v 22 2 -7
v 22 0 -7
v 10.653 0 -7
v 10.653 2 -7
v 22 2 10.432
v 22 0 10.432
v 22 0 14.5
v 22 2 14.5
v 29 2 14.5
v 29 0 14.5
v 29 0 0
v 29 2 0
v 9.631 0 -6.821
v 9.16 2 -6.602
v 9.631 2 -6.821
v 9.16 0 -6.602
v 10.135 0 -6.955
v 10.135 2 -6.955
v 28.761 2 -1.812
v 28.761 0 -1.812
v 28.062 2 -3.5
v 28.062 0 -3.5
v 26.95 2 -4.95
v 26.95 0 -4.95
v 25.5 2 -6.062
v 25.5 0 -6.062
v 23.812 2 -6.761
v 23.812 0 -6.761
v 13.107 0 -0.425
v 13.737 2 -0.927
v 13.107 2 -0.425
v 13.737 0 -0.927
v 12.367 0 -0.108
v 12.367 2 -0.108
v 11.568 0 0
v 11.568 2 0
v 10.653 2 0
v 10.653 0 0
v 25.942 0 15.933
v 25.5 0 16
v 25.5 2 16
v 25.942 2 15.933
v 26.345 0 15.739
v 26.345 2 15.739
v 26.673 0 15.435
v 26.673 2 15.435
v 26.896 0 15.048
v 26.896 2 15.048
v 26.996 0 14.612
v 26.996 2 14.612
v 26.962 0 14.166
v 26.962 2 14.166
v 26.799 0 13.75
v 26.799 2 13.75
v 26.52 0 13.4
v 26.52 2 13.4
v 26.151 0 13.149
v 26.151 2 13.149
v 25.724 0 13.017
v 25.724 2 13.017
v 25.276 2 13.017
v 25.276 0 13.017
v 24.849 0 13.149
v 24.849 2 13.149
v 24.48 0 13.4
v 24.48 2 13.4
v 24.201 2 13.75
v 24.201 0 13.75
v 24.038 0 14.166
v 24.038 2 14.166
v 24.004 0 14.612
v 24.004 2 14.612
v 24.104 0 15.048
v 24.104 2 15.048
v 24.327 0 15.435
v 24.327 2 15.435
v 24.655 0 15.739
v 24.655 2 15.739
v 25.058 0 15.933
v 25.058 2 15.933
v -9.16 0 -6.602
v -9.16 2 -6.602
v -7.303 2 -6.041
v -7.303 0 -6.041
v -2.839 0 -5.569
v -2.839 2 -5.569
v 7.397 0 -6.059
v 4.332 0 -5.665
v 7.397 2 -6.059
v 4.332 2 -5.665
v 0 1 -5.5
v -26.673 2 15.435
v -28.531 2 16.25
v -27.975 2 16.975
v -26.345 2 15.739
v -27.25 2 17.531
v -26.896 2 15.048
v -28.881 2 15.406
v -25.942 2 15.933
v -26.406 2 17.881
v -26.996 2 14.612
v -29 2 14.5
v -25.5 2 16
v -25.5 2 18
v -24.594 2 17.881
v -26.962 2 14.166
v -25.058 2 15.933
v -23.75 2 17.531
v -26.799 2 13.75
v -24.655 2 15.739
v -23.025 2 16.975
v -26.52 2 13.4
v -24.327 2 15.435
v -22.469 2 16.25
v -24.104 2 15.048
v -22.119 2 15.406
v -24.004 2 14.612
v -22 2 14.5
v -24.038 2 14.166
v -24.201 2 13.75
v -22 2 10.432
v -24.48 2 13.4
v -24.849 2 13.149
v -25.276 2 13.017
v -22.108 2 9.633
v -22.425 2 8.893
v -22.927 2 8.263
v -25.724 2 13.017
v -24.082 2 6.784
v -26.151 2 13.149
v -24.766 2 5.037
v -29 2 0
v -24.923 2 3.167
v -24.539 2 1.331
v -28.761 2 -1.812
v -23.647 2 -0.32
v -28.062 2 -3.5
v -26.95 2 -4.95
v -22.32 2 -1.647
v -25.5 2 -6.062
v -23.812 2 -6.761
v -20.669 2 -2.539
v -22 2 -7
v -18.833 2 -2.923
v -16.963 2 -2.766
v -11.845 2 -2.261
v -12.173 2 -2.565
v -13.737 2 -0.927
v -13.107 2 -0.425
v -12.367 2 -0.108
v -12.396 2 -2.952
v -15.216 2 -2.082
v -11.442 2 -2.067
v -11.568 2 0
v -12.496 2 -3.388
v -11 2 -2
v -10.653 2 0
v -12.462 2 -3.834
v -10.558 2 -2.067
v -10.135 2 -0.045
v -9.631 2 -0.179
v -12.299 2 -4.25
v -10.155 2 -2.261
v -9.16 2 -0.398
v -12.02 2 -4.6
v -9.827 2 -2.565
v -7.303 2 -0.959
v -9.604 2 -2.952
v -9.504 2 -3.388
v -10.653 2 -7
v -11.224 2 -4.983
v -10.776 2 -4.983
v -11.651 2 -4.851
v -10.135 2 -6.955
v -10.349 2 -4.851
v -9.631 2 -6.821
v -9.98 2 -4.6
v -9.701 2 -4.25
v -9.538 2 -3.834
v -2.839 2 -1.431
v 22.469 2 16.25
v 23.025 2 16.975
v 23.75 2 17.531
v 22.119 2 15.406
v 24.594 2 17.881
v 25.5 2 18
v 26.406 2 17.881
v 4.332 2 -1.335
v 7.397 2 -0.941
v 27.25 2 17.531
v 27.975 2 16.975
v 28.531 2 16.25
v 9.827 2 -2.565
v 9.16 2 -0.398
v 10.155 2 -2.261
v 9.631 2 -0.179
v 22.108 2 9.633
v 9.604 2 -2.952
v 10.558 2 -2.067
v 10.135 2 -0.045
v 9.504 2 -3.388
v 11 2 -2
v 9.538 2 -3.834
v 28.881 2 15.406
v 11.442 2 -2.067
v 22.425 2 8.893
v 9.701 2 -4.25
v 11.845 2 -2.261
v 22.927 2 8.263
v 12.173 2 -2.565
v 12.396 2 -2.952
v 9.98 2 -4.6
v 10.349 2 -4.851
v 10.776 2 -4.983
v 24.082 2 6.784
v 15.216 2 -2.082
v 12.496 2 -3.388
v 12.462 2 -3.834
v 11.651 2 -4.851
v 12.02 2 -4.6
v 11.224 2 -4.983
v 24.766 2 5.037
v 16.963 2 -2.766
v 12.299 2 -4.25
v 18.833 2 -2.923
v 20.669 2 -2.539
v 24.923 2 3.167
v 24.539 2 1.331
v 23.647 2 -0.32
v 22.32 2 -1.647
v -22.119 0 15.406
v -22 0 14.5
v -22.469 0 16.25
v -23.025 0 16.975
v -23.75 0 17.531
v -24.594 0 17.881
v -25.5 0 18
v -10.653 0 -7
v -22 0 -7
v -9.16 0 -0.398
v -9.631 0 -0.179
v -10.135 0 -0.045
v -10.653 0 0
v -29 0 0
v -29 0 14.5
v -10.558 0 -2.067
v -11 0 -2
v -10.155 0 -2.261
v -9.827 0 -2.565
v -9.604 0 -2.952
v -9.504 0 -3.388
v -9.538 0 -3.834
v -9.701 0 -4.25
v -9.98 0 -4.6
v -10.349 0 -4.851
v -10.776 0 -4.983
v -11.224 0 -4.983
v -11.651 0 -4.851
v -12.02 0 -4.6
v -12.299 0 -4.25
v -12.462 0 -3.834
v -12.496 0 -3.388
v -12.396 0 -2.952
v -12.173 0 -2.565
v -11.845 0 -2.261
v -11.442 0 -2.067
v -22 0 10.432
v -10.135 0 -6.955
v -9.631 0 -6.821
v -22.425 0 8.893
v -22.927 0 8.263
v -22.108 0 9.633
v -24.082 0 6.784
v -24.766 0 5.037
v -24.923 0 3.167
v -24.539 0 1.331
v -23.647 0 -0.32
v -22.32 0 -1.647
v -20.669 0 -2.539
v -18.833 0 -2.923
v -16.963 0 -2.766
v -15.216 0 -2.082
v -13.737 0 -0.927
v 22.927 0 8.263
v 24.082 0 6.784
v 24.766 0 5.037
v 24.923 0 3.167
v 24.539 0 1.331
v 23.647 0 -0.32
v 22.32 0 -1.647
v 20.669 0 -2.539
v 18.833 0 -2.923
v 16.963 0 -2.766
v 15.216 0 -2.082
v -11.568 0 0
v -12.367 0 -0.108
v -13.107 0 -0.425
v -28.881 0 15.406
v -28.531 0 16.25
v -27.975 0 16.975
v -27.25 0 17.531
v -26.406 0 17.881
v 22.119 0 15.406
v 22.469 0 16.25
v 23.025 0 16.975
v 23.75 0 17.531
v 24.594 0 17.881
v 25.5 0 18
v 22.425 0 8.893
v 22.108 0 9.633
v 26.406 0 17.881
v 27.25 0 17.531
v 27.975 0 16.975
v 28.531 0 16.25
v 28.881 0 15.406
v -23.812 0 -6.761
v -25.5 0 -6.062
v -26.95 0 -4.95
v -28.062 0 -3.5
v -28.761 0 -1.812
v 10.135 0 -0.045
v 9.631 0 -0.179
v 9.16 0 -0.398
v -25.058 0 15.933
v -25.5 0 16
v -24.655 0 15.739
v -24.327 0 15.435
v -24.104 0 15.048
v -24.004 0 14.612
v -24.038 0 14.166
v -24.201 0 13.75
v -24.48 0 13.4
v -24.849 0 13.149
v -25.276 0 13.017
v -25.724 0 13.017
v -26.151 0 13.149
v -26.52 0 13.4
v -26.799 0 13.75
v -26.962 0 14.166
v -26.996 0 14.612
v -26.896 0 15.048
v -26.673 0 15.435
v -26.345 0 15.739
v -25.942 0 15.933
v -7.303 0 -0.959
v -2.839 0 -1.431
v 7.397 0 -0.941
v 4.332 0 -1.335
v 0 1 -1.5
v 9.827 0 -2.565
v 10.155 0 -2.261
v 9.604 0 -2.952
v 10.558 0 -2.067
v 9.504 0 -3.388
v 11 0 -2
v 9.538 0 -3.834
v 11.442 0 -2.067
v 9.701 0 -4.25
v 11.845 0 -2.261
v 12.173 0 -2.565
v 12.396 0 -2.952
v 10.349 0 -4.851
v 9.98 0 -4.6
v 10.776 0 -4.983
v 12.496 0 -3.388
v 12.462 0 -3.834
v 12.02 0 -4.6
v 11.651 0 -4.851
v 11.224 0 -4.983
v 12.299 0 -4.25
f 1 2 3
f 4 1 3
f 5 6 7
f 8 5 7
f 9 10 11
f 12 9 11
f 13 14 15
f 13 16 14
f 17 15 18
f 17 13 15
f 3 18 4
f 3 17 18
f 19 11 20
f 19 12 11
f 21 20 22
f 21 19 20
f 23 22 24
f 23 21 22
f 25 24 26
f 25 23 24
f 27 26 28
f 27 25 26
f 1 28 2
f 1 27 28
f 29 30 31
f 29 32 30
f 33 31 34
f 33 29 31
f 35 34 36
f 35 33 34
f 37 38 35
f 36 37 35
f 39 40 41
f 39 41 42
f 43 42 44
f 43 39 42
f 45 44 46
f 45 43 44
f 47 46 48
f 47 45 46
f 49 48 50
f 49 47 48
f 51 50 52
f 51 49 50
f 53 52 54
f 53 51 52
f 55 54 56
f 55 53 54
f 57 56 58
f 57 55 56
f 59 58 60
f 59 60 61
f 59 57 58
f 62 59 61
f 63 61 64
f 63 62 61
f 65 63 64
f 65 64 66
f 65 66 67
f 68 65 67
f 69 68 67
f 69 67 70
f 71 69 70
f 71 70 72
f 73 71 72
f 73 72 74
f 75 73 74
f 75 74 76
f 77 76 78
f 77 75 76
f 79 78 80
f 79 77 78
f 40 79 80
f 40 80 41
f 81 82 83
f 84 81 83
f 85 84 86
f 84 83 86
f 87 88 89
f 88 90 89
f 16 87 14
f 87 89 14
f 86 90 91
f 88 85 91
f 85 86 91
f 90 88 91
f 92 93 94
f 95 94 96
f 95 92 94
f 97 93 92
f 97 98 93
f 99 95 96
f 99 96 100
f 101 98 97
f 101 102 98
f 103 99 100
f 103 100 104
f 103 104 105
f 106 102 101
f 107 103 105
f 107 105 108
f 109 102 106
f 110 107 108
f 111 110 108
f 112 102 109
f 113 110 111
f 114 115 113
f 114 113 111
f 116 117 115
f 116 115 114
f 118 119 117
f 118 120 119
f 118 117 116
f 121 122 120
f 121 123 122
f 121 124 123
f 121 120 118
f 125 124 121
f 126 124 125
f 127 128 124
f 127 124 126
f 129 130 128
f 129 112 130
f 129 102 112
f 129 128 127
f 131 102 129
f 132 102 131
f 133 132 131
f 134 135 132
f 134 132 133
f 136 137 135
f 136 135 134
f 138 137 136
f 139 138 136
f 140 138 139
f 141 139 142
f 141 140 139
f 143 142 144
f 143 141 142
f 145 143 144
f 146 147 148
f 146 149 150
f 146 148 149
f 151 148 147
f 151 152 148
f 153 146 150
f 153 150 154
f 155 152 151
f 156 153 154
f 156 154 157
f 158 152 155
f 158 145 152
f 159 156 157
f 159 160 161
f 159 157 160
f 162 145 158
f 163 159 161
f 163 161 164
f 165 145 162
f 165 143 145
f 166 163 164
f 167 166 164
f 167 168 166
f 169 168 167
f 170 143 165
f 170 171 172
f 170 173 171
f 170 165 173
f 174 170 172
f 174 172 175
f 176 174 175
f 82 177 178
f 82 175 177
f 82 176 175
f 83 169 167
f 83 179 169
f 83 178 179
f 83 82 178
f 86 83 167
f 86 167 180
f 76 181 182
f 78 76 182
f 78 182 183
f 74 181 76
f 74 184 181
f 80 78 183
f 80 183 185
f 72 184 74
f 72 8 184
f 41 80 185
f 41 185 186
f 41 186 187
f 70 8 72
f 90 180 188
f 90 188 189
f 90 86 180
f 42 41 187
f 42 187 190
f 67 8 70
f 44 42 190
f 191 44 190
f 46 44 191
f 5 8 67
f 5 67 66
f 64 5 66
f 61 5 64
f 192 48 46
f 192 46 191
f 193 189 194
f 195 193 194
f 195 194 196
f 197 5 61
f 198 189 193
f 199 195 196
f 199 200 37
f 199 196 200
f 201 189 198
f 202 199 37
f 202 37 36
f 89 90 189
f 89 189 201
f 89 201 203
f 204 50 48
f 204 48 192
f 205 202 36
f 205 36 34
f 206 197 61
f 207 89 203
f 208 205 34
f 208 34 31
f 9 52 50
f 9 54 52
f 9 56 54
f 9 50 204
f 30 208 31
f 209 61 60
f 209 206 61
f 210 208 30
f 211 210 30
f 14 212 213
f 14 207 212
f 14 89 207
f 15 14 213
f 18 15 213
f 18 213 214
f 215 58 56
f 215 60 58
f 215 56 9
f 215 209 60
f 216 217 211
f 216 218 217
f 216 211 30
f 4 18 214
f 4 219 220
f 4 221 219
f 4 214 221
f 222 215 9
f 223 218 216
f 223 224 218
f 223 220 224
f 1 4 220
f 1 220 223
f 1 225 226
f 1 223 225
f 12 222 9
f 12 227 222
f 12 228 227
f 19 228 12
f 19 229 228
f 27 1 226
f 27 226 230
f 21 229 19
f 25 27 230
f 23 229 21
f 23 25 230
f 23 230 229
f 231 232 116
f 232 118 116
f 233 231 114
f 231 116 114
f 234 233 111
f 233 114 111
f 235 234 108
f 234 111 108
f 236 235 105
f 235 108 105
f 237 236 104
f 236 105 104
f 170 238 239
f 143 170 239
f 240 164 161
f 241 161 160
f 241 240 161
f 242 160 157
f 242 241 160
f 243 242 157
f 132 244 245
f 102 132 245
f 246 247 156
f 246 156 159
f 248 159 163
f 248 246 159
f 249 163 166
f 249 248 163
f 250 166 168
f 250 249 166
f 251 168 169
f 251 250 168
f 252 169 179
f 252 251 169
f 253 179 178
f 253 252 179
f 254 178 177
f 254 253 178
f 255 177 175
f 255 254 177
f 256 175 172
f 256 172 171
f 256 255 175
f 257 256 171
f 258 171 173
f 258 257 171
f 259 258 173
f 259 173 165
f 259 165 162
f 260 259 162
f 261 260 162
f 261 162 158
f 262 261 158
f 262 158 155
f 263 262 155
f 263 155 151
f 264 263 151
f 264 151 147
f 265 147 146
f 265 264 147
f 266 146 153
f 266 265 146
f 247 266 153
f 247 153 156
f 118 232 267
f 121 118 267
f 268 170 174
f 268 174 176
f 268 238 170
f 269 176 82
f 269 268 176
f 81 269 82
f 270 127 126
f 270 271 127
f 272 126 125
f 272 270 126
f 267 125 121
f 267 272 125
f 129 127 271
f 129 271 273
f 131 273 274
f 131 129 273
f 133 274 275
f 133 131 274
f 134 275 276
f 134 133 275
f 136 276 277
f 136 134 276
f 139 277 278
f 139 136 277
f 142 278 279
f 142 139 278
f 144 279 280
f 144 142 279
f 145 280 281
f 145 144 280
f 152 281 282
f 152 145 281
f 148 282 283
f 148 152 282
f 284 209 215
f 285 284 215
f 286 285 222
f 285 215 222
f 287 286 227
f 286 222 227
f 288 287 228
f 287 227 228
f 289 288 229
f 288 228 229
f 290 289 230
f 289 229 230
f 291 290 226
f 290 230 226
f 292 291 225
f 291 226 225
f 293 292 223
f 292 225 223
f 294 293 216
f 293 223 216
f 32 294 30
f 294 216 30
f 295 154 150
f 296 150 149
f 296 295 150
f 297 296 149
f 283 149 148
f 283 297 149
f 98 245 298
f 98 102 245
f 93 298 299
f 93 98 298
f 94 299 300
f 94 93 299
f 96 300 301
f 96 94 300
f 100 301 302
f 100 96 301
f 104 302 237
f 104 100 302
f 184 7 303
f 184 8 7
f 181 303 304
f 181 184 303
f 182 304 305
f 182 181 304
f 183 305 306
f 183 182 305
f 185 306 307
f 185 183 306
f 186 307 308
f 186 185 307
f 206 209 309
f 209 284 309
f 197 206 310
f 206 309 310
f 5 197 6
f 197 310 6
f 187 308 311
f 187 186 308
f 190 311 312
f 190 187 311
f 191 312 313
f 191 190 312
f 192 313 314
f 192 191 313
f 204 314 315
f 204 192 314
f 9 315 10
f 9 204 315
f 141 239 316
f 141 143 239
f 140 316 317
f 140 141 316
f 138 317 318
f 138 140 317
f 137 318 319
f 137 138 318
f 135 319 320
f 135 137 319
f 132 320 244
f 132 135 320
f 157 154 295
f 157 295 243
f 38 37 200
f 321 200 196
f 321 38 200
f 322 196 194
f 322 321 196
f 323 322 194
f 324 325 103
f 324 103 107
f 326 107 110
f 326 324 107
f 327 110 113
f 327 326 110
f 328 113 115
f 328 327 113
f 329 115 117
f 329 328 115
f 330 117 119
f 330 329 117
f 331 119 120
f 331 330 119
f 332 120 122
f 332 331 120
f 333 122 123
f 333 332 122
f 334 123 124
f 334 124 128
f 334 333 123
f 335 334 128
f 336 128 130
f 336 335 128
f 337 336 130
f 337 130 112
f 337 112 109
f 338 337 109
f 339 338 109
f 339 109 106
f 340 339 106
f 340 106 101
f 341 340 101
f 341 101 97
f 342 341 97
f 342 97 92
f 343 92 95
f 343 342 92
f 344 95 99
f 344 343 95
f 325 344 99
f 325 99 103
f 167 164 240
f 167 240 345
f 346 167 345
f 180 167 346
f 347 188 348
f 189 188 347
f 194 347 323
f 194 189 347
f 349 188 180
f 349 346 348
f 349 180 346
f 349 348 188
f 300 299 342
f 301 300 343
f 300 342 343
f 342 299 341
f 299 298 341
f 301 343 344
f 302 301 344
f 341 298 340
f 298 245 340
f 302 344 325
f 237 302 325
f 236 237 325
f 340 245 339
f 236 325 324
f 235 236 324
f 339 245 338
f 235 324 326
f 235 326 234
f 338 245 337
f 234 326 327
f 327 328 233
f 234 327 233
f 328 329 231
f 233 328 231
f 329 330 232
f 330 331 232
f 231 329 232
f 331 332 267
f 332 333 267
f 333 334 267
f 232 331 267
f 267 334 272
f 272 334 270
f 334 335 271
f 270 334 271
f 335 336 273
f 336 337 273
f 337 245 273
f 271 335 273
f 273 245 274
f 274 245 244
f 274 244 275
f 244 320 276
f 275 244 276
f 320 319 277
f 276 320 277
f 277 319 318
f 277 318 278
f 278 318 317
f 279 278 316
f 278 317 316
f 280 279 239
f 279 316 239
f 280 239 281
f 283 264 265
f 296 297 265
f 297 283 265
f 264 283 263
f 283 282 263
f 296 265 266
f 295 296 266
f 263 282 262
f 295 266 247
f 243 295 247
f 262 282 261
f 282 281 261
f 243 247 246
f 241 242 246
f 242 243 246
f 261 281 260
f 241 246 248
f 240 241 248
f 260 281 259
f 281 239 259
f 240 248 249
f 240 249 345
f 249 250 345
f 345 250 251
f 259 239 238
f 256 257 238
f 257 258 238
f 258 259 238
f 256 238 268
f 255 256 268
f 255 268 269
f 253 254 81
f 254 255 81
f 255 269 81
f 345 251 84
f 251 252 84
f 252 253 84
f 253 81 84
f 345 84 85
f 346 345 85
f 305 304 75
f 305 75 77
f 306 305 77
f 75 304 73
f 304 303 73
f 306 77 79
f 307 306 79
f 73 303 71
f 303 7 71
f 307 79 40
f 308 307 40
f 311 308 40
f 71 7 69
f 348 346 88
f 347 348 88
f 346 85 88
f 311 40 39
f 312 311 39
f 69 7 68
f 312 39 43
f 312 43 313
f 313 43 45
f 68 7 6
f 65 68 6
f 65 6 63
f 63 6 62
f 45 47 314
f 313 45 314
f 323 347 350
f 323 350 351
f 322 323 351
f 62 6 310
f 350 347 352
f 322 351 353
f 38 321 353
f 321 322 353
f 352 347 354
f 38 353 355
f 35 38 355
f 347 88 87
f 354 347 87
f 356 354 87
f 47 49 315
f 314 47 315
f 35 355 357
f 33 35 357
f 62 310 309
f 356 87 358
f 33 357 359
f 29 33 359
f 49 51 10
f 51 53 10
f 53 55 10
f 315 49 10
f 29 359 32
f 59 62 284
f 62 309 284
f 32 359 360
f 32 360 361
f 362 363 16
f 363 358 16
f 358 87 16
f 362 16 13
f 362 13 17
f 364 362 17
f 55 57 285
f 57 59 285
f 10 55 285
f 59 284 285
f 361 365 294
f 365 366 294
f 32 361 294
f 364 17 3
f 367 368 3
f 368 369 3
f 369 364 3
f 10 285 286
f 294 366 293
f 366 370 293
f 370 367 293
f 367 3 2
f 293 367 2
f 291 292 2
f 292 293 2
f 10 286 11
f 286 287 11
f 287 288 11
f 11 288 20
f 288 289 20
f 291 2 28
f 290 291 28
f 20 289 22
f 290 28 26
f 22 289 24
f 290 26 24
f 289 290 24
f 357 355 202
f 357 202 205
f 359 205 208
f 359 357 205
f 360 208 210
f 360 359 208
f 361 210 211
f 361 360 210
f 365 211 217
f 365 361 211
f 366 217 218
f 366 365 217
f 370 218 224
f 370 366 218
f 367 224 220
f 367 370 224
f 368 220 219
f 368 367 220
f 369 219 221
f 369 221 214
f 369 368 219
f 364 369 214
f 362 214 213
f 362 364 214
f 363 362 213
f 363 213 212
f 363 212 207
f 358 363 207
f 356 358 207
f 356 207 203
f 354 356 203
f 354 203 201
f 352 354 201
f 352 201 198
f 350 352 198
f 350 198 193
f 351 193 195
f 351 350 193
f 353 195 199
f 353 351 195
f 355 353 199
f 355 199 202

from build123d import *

# Parameters (mm, degrees)
SKETCH1_R      = 1.5
EXTRUDE1_DEPTH = 2
FILLET1_R      = 3
FILLET2_R      = 3.5
EXTRUDE2_DEPTH = 2
EXTRUDE3_DEPTH = 2
FILLET3_R      = 3
FILLET5_R      = 7


with BuildPart() as part:
    # Sketch1 → Extrude1 (new body)
    # profile 1 of 2: a face of its own
    with BuildSketch(Plane(origin=(0, 0, 0), x_dir=(1, 0, 0), z_dir=(0, 1, 0))):
        Polygon((-22, 0), (0, 0), (0, 7), (-29, 7), (-29, -18), (-22, -18), align=None)
        with Locations(Location((-25.5, -14.5, 0), (0, 0, 270))):
            Circle(SKETCH1_R, mode=Mode.SUBTRACT)
        with Locations(Location((-11, 3.5, 0), (0, 0, 270))):
            Circle(SKETCH1_R, mode=Mode.SUBTRACT)
    # profile 2 of 2: a face of its own
    with BuildSketch(Plane(origin=(0, 0, 0), x_dir=(1, 0, 0), z_dir=(0, 1, 0))):
        Polygon((0, 0), (22, 0), (22, -18), (29, -18), (29, 7), (0, 7), align=None)
        with Locations(Location((25.5, -14.5, 0), (0, 0, 270))):
            Circle(SKETCH1_R, mode=Mode.SUBTRACT)
        with Locations(Location((11, 3.5, 0), (0, 0, 270))):
            Circle(SKETCH1_R, mode=Mode.SUBTRACT)
    extrude(amount=EXTRUDE1_DEPTH)

    # Fillet1
    fillet1_edges = [part.edges().sort_by_distance(p)[0] for p in [
        (-22, 1, 0),
        (22, 1, 0),
    ]]
    fillet(fillet1_edges, radius=FILLET1_R)

    # Fillet2
    fillet2_edges = [part.edges().sort_by_distance(p)[0] for p in [
        (29, 1, 18),
        (22, 1, 18),
        (-22, 1, 18),
        (-29, 1, 18),
    ]]
    fillet(fillet2_edges, radius=FILLET2_R - 0.0001)  # a hair under: the kernel refuses the full size

    # Sketch2 → Extrude2 (cut)
    with BuildSketch(Plane(origin=(0, 2, 0), x_dir=(1, 0, 0), z_dir=(0, 1, 0))):
        with BuildLine():
            Line((-9.5, 7), (9.5, 7))
            add(Edge.make_bspline(
                [(-9.5, 7), (-9.5, 5.5), (0, 5.5), (9.5, 5.5), (9.5, 7)],
                knots=[0, 0, 0, 1.570796327, 1.570796327, 3.141592654, 3.141592654, 3.141592654], degree=2, weights=[1, 0.707106781, 1, 0.707106781, 1]))
        make_face()
    extrude2 = extrude(amount=-EXTRUDE2_DEPTH, mode=Mode.SUBTRACT)

    # Mirror1: Extrude2 across plane
    add(extrude2.mirror(Plane(origin=(0, 0, -3.5), x_dir=(1, 0, 0), z_dir=(0, 0, -1))), mode=Mode.SUBTRACT)

    # Sketch3 → Extrude3 (cut)
    with BuildSketch(Plane(origin=(0, 2, 0), x_dir=(-1, 0, 0), z_dir=(0, 1, 0))):
        with BuildLine():
            Line((-13, 0), (-19, 0))
            ThreePointArc((-19, 0), (-21.121320344, 0.878679656), (-22, 3))
            Line((-22, 3), (-22, 9))
            ThreePointArc((-22, 9), (-23.031608424, -1.031608424), (-13, 0))
        make_face()
    extrude3 = extrude(amount=-EXTRUDE3_DEPTH, mode=Mode.SUBTRACT)

    # Mirror4: Extrude3 across plane
    add(extrude3.mirror(Plane(origin=(0, 0, 0), x_dir=(0, 0, 1), z_dir=(1, 0, 0))), mode=Mode.SUBTRACT)

    # Fillet3
    fillet3_edges = [part.edges().sort_by_distance(p)[0] for p in [
        (9.5, 1, 0),
        (-9.5, 1, 0),
        (22, 1, 9),
        (13, 1, 0),
        (-9.5, 1, -7),
        (9.5, 1, -7),
        (-22, 1, 9),
        (-13, 1, 0),
    ]]
    fillet(fillet3_edges, radius=FILLET3_R)

    # Fillet5
    fillet5_edges = [part.edges().sort_by_distance(p)[0] for p in [
        (-29, 1, -7),
        (29, 1, -7),
    ]]
    fillet(fillet5_edges, radius=FILLET5_R)


solid = part.part
